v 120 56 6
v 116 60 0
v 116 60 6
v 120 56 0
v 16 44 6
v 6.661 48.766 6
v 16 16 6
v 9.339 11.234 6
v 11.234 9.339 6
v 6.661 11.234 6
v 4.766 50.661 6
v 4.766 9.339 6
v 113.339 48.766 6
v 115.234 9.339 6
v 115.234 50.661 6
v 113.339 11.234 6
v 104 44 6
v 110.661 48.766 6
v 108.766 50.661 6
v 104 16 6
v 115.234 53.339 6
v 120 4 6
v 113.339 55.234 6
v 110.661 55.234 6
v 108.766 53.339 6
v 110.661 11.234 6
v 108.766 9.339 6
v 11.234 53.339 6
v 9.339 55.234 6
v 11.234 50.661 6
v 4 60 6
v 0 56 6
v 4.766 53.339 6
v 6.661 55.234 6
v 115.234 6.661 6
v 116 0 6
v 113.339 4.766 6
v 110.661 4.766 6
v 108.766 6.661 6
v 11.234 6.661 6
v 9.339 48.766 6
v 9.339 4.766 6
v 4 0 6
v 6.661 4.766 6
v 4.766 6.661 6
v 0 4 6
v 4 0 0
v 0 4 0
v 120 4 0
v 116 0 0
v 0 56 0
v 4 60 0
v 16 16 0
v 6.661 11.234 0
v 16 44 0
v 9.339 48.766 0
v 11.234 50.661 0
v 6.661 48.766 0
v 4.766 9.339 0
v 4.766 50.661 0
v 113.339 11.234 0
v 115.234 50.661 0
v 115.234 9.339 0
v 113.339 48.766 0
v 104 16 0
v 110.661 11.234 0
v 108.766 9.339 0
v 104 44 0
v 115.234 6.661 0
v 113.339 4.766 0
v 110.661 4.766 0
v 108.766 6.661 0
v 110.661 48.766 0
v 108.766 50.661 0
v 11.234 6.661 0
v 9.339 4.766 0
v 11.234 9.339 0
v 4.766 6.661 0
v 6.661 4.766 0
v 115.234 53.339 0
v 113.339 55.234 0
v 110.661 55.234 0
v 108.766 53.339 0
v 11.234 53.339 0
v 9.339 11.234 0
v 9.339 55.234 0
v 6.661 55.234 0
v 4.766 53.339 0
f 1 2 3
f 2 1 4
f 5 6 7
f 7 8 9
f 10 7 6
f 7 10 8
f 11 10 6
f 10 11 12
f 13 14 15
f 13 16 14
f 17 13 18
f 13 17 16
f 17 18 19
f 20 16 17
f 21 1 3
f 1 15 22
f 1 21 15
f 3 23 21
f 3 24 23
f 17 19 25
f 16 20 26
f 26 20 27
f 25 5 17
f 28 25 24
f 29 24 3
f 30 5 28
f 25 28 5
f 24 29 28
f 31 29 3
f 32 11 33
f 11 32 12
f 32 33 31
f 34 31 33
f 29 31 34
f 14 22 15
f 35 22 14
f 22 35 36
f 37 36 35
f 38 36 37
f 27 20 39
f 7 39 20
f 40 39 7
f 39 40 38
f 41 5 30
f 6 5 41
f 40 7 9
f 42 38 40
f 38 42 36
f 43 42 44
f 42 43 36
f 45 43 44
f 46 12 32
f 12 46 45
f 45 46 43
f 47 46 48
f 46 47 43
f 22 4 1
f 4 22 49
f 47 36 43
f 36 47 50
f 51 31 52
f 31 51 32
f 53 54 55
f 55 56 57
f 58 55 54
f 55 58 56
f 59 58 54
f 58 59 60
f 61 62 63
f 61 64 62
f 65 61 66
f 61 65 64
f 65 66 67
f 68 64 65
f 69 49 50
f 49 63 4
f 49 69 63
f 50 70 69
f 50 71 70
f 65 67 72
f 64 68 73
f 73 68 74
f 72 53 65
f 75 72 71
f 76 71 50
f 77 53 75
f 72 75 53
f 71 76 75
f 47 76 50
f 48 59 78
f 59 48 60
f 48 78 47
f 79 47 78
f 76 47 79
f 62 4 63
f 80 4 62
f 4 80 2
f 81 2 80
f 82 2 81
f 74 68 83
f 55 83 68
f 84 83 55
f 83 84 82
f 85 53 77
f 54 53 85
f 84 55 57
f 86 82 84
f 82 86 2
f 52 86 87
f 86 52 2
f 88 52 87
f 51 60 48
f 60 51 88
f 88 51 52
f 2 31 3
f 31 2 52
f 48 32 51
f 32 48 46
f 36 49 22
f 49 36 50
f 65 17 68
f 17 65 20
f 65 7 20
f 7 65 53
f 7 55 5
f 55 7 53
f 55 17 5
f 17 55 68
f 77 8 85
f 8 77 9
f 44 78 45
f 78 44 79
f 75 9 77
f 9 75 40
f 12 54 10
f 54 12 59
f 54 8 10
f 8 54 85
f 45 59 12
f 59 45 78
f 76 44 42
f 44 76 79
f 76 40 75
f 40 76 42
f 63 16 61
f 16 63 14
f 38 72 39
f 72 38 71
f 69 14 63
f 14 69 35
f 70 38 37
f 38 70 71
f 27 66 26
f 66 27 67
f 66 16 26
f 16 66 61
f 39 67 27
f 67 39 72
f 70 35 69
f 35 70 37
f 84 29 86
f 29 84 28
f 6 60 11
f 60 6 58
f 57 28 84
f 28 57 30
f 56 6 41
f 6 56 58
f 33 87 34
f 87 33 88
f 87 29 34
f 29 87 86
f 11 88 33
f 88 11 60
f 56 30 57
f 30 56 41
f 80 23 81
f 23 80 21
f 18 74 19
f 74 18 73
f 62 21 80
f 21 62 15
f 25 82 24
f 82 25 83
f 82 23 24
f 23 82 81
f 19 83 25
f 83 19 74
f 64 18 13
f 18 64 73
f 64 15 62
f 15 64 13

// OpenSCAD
$fn = 32;

// ----------------------------------------------------------------------
// Frame plate: 120 x 60 frame, 16 mm rails
// ----------------------------------------------------------------------

// --- parameters (mm) ---
plate_l = 120;            // plate length, X
plate_w = 60;             // plate width, Y
plate_t = 6;              // plate thickness, Z (extrusion height)
corner_c = 4;             // corner chamfer
frame_bar = 16;           // frame rail width
bolt_r = 3.5;             // corner bolt window radius
bolt_inset = 8;           // bolt centre inset from the edges

win_l = plate_l - 2 * frame_bar;  // window length
win_w = plate_w - 2 * frame_bar;  // window width
bolt_d = 2 * bolt_r;  // corner hole diameter

profile = [[4, 0], [116, 0], [120, 4], [120, 56], [116, 60], [4, 60], [0, 56], [0, 4]];  // primary outline, 8 points, counter clockwise
void_1 = [[16, 16], [104, 16], [104, 44], [16, 44]];  // the window, 4 points
void_2 = [[11.234, 9.339], [9.339, 11.234], [6.661, 11.234], [4.766, 9.339], [4.766, 6.661], [6.661, 4.766], [9.339, 4.766], [11.234, 6.661]];  // corner bolt window, 8 points
void_3 = [[115.234, 9.339], [113.339, 11.234], [110.661, 11.234], [108.766, 9.339], [108.766, 6.661], [110.661, 4.766], [113.339, 4.766], [115.234, 6.661]];  // corner bolt window, 8 points
void_4 = [[11.234, 53.339], [9.339, 55.234], [6.661, 55.234], [4.766, 53.339], [4.766, 50.661], [6.661, 48.766], [9.339, 48.766], [11.234, 50.661]];  // corner bolt window, 8 points
void_5 = [[115.234, 53.339], [113.339, 55.234], [110.661, 55.234], [108.766, 53.339], [108.766, 50.661], [110.661, 48.766], [113.339, 48.766], [115.234, 50.661]];  // corner bolt window, 8 points

// --- the one profile operation ---
difference() {
  linear_extrude(height = plate_t) polygon(points = profile);
  translate([0, 0, -1])
    linear_extrude(height = plate_t + 2) polygon(points = void_1);
  translate([0, 0, -1])
    linear_extrude(height = plate_t + 2) polygon(points = void_2);
  translate([0, 0, -1])
    linear_extrude(height = plate_t + 2) polygon(points = void_3);
  translate([0, 0, -1])
    linear_extrude(height = plate_t + 2) polygon(points = void_4);
  translate([0, 0, -1])
    linear_extrude(height = plate_t + 2) polygon(points = void_5);
}
